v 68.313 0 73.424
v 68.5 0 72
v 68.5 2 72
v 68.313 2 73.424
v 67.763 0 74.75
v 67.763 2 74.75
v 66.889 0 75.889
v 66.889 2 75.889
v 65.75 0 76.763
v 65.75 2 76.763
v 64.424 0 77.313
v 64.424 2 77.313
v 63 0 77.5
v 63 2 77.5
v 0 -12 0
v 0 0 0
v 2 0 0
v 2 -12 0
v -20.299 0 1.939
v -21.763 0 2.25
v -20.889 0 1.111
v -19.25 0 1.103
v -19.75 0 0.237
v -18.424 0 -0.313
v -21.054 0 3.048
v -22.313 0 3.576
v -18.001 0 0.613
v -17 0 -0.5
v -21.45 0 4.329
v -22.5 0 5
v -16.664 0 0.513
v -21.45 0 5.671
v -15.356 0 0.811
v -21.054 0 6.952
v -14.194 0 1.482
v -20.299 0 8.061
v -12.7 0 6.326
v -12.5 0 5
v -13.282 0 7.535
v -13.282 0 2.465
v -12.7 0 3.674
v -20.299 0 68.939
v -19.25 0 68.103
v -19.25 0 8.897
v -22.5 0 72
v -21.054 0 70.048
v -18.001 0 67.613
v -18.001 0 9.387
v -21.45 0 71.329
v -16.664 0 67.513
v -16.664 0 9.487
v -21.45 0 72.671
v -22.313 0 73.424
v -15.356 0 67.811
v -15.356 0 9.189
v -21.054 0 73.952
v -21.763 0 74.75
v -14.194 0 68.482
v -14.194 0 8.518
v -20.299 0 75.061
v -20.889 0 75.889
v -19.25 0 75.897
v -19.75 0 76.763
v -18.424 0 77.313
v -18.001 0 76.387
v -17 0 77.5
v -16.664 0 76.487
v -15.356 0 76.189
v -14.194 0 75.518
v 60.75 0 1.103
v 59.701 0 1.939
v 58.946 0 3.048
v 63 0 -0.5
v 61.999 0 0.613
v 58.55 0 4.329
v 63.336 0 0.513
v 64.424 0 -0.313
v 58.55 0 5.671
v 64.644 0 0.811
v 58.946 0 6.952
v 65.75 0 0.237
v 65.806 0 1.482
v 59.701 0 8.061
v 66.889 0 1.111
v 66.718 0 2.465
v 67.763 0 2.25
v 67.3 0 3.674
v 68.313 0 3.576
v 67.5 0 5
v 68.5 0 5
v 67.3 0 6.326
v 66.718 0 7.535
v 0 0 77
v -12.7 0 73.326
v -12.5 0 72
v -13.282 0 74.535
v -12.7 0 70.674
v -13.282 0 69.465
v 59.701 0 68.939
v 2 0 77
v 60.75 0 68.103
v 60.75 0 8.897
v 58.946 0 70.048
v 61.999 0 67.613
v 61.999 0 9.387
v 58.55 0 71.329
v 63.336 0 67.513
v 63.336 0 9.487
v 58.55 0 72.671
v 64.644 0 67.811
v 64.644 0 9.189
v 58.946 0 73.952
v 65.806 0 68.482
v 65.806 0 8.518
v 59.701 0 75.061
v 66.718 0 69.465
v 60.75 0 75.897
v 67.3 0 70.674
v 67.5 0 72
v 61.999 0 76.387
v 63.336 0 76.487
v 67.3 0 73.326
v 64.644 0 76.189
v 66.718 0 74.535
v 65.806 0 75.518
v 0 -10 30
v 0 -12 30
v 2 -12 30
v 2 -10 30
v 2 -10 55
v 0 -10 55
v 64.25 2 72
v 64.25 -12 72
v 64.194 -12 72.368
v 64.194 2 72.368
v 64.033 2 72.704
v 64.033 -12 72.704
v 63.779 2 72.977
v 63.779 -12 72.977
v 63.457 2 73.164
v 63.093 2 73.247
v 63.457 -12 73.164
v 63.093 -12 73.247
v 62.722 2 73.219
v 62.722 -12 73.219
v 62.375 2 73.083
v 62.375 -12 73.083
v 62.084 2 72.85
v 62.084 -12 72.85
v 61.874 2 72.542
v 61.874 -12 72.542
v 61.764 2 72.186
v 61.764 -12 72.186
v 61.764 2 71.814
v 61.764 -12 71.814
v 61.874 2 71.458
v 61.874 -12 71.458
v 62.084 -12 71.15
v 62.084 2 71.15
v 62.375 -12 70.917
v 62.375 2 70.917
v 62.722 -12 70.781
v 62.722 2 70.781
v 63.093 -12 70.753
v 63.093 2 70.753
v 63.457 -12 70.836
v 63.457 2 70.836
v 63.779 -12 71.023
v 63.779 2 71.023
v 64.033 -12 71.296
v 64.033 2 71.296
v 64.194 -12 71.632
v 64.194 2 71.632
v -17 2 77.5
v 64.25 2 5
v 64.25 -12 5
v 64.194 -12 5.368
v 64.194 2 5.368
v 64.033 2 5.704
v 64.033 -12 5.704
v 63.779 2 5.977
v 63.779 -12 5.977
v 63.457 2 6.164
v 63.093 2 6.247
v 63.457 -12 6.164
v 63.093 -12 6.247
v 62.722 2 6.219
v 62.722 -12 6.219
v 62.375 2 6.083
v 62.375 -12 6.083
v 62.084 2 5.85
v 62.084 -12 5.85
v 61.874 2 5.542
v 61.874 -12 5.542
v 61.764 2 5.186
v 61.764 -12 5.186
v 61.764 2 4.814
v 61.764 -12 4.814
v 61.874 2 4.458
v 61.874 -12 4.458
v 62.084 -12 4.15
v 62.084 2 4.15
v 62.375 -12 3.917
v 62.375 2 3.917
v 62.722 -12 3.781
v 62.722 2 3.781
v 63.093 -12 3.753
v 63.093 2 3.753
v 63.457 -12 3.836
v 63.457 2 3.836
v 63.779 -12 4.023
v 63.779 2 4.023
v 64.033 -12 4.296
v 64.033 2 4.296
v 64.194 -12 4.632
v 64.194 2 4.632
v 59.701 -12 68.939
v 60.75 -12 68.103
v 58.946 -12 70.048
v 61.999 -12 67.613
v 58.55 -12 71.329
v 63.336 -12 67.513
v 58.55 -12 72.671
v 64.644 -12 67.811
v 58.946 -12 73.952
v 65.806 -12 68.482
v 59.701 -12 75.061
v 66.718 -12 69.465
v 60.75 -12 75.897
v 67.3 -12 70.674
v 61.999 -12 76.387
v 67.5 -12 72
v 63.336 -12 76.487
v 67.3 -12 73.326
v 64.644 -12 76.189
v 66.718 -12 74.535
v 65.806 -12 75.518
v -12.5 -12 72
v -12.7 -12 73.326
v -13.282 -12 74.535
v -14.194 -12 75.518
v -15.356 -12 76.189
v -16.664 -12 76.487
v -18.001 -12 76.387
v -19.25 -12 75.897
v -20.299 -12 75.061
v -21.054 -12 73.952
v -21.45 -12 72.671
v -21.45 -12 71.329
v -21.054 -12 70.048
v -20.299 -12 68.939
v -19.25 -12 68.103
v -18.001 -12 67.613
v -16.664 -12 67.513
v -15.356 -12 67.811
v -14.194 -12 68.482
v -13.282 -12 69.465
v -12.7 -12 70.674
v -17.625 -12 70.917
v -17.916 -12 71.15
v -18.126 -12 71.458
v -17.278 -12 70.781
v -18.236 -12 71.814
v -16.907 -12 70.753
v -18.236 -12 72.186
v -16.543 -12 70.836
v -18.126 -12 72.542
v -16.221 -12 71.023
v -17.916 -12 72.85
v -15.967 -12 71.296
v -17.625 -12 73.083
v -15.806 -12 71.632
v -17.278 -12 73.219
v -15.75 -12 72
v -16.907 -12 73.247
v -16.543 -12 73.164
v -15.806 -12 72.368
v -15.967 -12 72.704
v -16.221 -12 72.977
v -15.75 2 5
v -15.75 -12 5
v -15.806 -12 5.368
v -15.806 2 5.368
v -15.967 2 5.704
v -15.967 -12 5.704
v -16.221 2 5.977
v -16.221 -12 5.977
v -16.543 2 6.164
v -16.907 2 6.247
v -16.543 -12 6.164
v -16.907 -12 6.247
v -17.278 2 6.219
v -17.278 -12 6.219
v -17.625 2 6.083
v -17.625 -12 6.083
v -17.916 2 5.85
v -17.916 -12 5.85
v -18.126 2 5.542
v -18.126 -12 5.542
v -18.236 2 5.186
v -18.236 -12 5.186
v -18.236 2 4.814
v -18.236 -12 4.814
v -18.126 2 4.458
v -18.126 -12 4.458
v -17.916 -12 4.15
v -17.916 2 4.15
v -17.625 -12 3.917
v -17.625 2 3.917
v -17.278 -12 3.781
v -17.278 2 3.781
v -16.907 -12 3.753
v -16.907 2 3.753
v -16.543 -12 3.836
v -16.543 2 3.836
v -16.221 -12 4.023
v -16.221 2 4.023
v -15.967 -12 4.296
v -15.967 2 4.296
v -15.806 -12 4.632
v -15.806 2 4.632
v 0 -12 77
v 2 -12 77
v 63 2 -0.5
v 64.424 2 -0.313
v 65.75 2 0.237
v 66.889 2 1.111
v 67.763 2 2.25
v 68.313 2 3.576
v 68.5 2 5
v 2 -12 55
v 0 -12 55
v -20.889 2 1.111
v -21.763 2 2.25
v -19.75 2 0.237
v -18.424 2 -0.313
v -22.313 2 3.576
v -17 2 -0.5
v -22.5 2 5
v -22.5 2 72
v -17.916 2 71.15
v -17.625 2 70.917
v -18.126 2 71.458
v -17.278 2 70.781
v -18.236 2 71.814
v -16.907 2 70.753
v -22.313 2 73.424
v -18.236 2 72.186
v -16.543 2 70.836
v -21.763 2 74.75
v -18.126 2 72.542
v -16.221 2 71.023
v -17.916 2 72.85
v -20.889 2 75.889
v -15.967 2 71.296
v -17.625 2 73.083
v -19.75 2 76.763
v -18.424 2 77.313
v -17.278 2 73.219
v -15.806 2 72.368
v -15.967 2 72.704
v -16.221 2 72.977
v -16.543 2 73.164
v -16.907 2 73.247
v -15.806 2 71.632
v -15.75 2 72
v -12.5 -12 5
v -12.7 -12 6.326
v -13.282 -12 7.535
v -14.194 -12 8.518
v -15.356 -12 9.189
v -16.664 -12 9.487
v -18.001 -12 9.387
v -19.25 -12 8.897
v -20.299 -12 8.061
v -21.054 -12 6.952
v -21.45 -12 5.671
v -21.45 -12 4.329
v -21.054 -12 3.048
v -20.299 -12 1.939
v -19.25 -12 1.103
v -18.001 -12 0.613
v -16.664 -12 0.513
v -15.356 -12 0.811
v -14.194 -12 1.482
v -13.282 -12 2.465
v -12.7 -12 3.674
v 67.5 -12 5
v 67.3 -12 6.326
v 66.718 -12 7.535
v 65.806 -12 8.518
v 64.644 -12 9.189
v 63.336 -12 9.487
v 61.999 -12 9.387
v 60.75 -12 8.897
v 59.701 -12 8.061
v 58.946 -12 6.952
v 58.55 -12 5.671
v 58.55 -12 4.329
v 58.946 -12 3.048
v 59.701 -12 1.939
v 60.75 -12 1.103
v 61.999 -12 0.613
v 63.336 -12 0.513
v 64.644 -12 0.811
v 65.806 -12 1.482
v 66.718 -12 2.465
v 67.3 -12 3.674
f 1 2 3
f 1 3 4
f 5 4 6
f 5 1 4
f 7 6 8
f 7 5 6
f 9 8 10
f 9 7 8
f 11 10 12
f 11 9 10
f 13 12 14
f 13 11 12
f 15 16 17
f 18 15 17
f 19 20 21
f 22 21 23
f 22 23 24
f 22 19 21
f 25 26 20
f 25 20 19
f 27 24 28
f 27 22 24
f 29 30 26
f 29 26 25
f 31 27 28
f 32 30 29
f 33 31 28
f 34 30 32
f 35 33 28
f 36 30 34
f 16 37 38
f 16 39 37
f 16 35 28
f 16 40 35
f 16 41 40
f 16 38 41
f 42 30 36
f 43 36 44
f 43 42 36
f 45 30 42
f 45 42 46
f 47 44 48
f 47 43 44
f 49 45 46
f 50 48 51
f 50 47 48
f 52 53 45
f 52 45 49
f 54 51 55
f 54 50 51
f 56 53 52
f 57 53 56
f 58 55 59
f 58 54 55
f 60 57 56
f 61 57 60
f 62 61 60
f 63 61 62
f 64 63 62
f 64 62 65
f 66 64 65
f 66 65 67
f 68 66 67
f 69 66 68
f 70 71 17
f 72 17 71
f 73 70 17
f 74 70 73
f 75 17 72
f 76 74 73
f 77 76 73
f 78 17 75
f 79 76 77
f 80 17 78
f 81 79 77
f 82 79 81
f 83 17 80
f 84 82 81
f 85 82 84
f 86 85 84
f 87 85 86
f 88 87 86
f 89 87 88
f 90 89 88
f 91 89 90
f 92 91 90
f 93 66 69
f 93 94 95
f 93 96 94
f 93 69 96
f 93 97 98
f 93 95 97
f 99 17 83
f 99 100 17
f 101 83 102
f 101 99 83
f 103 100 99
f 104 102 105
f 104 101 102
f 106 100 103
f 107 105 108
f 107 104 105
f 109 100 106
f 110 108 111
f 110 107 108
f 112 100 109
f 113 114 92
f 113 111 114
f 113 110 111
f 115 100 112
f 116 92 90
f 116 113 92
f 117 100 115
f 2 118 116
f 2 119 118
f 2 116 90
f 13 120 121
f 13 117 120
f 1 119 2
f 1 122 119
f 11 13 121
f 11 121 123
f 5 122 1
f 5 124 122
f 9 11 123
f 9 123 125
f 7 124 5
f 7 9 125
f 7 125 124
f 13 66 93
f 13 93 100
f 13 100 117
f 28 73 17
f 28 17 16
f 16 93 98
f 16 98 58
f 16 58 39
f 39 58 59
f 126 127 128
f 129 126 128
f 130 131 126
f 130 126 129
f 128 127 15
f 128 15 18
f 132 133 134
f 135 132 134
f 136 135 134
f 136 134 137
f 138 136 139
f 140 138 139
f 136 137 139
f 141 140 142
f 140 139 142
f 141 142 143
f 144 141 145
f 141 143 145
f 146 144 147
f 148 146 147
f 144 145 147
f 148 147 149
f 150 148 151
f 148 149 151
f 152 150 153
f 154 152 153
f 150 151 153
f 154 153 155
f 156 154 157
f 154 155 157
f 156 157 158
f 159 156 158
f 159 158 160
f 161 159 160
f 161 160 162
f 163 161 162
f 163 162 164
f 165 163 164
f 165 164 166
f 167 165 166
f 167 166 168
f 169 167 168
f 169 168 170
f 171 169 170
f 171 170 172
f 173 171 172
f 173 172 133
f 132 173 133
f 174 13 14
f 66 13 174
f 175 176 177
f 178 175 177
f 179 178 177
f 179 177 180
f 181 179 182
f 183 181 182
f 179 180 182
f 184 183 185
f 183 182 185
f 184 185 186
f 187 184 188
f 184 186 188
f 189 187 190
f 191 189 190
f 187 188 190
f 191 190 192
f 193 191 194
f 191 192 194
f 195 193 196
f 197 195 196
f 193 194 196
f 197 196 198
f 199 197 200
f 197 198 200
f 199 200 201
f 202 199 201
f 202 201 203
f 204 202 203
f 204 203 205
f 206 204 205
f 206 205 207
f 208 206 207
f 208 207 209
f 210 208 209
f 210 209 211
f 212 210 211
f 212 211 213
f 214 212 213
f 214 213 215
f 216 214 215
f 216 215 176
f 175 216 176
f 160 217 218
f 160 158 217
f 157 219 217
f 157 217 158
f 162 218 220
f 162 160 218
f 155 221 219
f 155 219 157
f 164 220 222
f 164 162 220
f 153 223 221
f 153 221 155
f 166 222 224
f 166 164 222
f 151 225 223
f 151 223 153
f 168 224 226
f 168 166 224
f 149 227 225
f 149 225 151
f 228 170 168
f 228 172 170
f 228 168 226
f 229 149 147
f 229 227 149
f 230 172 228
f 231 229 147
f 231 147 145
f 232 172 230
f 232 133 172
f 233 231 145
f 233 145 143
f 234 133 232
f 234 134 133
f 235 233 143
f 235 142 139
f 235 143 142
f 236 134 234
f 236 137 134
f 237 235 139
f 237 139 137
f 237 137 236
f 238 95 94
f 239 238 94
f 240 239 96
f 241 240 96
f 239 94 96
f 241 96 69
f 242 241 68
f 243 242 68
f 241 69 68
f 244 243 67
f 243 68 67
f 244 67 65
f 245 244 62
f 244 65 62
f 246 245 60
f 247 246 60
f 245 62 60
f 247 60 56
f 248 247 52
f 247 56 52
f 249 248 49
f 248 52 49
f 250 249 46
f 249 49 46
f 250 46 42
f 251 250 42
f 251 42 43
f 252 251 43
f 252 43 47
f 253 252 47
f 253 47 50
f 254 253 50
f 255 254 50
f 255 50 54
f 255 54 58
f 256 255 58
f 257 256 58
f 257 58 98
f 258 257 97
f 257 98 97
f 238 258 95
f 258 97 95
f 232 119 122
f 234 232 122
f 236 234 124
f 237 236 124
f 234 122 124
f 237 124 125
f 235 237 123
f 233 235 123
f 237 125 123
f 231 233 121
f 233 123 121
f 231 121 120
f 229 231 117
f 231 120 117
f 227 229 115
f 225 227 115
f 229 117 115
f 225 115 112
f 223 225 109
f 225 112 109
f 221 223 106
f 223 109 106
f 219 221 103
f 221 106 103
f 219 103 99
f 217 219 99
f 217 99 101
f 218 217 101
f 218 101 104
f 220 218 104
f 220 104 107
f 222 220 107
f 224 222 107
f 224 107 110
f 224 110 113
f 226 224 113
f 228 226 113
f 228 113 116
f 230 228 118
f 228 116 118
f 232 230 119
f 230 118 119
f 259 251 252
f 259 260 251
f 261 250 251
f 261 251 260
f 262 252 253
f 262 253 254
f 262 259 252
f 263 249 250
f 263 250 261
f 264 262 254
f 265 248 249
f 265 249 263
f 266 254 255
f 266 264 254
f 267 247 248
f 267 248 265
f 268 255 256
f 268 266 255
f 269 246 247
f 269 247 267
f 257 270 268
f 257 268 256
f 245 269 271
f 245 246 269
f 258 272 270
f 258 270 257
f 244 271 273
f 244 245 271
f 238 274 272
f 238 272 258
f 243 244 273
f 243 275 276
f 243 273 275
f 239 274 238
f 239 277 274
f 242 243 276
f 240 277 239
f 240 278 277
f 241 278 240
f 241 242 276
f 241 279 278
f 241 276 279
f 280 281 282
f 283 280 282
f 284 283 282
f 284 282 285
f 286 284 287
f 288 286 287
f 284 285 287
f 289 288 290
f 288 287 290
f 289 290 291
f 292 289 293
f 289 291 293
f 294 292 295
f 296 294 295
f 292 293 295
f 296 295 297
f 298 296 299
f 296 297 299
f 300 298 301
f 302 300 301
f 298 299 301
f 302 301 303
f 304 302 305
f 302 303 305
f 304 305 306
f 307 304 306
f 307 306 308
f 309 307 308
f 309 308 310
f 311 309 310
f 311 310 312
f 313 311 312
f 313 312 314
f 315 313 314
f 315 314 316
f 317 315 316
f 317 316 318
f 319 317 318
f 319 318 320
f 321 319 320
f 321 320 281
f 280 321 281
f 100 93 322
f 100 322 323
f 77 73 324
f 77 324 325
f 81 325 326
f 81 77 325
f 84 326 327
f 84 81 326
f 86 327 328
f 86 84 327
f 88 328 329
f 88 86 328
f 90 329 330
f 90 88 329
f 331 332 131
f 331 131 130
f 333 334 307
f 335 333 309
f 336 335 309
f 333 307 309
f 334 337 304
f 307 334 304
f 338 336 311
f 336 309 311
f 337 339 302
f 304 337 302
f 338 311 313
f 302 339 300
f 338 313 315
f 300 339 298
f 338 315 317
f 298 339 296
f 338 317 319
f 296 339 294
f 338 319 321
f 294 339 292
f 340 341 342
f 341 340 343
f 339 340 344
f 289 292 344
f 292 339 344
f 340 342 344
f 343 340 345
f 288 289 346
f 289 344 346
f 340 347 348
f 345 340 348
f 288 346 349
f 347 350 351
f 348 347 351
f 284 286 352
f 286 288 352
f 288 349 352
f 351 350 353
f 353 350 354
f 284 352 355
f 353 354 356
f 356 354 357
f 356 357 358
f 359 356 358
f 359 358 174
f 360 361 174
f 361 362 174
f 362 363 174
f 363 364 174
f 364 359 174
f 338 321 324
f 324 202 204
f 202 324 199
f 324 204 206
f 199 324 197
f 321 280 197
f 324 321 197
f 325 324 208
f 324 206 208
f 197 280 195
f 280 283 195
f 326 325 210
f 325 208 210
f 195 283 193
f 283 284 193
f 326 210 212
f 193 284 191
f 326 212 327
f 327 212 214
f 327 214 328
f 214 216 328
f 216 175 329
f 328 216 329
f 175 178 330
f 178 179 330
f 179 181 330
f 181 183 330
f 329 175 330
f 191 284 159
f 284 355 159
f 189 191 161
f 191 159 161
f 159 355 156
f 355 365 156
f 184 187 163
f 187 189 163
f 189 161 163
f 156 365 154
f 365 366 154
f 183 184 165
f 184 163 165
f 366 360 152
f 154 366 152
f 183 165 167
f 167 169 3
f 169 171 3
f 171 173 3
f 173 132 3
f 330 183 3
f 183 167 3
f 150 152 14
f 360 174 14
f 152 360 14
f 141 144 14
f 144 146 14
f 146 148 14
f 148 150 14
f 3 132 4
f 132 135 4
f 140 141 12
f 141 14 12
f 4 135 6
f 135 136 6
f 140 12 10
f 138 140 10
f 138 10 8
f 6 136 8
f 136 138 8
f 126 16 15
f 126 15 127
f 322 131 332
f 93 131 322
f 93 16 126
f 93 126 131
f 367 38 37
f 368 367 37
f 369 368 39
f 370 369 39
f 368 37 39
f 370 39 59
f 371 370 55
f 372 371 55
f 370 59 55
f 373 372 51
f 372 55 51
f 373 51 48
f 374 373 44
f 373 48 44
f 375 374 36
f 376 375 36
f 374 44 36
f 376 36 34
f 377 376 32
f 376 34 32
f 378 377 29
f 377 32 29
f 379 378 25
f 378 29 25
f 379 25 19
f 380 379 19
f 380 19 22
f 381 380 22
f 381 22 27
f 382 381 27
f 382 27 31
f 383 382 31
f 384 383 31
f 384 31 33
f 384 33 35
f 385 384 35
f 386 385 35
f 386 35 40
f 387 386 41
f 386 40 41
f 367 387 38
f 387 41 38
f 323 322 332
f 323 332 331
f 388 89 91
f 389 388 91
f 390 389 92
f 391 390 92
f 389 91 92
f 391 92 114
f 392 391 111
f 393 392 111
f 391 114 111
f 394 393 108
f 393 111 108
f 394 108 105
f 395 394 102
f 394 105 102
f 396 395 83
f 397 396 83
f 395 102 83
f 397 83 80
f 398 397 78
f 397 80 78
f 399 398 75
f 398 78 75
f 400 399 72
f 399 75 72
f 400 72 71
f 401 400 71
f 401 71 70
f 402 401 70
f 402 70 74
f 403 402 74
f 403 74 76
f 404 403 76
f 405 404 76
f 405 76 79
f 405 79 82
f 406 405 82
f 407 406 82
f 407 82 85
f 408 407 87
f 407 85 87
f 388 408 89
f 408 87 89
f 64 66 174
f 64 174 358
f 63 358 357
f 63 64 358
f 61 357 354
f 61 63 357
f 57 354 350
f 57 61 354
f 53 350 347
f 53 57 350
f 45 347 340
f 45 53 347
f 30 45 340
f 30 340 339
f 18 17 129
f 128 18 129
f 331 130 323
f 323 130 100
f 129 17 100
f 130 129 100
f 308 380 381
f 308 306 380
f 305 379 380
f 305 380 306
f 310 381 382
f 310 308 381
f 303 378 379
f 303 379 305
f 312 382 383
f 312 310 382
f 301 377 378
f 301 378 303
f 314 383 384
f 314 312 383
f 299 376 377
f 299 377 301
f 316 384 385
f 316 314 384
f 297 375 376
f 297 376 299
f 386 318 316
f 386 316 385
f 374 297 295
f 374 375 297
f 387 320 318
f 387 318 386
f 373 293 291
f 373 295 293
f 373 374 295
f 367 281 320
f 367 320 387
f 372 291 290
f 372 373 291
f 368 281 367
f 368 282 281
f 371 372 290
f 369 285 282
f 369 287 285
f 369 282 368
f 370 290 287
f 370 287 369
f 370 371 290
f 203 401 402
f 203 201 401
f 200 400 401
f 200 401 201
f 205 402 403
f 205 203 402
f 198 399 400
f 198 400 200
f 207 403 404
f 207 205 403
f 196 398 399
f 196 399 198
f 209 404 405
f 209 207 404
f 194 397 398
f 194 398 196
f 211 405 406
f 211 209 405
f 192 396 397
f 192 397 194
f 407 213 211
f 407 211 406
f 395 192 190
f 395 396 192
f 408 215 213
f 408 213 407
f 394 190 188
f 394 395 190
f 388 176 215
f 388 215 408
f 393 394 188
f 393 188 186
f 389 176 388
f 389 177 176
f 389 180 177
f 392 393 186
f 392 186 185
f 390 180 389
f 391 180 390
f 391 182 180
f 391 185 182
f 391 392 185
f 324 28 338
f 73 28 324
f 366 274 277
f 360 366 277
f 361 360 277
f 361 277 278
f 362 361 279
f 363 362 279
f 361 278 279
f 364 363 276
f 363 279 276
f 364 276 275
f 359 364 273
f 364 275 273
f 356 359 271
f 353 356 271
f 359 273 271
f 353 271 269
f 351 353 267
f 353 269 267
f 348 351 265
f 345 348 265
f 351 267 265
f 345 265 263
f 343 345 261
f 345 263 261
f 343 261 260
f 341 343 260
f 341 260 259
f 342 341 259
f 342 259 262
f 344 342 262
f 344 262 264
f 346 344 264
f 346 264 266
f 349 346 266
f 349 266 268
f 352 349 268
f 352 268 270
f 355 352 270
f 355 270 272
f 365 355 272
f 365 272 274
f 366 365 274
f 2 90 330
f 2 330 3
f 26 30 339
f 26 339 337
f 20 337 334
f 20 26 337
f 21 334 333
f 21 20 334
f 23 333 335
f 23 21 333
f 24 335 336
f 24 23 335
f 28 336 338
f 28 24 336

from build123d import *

# Parameters (mm, degrees)
F1_DEPTH = 2
F2_R     = 4.5
F2_W     = 2
F2_H     = 77
F3_DEPTH = 12
F4_R     = 1.25
F5_DEPTH = 25
F6_W     = 2
F6_H     = 25
F7_DEPTH = 2


with BuildPart() as f1:
    # F0 (on Front) → F1 (new body)
    with BuildSketch(Plane.XZ):
        with BuildLine():
            Line((63, 77.5), (-17, 77.5))
            ThreePointArc((-17, 77.5), (-20.889087, 75.889087), (-22.5, 72))
            Line((-22.5, 72), (-22.5, 5))
            ThreePointArc((-22.5, 5), (-20.889087, 1.110913), (-17, -0.5))
            Line((-17, -0.5), (63, -0.5))
            ThreePointArc((63, -0.5), (66.889087, 1.110913), (68.5, 5))
            Line((68.5, 5), (68.5, 72))
            ThreePointArc((68.5, 72), (66.889087, 75.889087), (63, 77.5))
        make_face()
    extrude(amount=-F1_DEPTH)

    # F2 (on Front) → F3 (join)
    with BuildSketch(Plane.XZ):
        with Locations((-17, 72)):
            Circle(F2_R)
        with Locations((63, 72)):
            Circle(F2_R)
        with Locations((-17, 5)):
            Circle(F2_R)
        with Locations((63, 5)):
            Circle(F2_R)
        with Locations((1, 38.5)):
            Rectangle(F2_W, F2_H)
    extrude(amount=F3_DEPTH)

    # F4 (on face) → F5 (cut)
    with BuildSketch(Plane.XZ.offset(12)):
        with Locations((-17, 72)):
            Circle(F4_R)
        with Locations((63, 72)):
            Circle(F4_R)
        with Locations((63, 5)):
            Circle(F4_R)
        with Locations((-17, 5)):
            Circle(F4_R)
    extrude(amount=-F5_DEPTH, mode=Mode.SUBTRACT)

    # F6 (on face) → F7 (cut)
    with BuildSketch(Plane.XZ.offset(12)):
        with Locations((1, 42.5)):
            Rectangle(F6_W, F6_H)
    extrude(amount=-F7_DEPTH, mode=Mode.SUBTRACT)


solid = f1.part
